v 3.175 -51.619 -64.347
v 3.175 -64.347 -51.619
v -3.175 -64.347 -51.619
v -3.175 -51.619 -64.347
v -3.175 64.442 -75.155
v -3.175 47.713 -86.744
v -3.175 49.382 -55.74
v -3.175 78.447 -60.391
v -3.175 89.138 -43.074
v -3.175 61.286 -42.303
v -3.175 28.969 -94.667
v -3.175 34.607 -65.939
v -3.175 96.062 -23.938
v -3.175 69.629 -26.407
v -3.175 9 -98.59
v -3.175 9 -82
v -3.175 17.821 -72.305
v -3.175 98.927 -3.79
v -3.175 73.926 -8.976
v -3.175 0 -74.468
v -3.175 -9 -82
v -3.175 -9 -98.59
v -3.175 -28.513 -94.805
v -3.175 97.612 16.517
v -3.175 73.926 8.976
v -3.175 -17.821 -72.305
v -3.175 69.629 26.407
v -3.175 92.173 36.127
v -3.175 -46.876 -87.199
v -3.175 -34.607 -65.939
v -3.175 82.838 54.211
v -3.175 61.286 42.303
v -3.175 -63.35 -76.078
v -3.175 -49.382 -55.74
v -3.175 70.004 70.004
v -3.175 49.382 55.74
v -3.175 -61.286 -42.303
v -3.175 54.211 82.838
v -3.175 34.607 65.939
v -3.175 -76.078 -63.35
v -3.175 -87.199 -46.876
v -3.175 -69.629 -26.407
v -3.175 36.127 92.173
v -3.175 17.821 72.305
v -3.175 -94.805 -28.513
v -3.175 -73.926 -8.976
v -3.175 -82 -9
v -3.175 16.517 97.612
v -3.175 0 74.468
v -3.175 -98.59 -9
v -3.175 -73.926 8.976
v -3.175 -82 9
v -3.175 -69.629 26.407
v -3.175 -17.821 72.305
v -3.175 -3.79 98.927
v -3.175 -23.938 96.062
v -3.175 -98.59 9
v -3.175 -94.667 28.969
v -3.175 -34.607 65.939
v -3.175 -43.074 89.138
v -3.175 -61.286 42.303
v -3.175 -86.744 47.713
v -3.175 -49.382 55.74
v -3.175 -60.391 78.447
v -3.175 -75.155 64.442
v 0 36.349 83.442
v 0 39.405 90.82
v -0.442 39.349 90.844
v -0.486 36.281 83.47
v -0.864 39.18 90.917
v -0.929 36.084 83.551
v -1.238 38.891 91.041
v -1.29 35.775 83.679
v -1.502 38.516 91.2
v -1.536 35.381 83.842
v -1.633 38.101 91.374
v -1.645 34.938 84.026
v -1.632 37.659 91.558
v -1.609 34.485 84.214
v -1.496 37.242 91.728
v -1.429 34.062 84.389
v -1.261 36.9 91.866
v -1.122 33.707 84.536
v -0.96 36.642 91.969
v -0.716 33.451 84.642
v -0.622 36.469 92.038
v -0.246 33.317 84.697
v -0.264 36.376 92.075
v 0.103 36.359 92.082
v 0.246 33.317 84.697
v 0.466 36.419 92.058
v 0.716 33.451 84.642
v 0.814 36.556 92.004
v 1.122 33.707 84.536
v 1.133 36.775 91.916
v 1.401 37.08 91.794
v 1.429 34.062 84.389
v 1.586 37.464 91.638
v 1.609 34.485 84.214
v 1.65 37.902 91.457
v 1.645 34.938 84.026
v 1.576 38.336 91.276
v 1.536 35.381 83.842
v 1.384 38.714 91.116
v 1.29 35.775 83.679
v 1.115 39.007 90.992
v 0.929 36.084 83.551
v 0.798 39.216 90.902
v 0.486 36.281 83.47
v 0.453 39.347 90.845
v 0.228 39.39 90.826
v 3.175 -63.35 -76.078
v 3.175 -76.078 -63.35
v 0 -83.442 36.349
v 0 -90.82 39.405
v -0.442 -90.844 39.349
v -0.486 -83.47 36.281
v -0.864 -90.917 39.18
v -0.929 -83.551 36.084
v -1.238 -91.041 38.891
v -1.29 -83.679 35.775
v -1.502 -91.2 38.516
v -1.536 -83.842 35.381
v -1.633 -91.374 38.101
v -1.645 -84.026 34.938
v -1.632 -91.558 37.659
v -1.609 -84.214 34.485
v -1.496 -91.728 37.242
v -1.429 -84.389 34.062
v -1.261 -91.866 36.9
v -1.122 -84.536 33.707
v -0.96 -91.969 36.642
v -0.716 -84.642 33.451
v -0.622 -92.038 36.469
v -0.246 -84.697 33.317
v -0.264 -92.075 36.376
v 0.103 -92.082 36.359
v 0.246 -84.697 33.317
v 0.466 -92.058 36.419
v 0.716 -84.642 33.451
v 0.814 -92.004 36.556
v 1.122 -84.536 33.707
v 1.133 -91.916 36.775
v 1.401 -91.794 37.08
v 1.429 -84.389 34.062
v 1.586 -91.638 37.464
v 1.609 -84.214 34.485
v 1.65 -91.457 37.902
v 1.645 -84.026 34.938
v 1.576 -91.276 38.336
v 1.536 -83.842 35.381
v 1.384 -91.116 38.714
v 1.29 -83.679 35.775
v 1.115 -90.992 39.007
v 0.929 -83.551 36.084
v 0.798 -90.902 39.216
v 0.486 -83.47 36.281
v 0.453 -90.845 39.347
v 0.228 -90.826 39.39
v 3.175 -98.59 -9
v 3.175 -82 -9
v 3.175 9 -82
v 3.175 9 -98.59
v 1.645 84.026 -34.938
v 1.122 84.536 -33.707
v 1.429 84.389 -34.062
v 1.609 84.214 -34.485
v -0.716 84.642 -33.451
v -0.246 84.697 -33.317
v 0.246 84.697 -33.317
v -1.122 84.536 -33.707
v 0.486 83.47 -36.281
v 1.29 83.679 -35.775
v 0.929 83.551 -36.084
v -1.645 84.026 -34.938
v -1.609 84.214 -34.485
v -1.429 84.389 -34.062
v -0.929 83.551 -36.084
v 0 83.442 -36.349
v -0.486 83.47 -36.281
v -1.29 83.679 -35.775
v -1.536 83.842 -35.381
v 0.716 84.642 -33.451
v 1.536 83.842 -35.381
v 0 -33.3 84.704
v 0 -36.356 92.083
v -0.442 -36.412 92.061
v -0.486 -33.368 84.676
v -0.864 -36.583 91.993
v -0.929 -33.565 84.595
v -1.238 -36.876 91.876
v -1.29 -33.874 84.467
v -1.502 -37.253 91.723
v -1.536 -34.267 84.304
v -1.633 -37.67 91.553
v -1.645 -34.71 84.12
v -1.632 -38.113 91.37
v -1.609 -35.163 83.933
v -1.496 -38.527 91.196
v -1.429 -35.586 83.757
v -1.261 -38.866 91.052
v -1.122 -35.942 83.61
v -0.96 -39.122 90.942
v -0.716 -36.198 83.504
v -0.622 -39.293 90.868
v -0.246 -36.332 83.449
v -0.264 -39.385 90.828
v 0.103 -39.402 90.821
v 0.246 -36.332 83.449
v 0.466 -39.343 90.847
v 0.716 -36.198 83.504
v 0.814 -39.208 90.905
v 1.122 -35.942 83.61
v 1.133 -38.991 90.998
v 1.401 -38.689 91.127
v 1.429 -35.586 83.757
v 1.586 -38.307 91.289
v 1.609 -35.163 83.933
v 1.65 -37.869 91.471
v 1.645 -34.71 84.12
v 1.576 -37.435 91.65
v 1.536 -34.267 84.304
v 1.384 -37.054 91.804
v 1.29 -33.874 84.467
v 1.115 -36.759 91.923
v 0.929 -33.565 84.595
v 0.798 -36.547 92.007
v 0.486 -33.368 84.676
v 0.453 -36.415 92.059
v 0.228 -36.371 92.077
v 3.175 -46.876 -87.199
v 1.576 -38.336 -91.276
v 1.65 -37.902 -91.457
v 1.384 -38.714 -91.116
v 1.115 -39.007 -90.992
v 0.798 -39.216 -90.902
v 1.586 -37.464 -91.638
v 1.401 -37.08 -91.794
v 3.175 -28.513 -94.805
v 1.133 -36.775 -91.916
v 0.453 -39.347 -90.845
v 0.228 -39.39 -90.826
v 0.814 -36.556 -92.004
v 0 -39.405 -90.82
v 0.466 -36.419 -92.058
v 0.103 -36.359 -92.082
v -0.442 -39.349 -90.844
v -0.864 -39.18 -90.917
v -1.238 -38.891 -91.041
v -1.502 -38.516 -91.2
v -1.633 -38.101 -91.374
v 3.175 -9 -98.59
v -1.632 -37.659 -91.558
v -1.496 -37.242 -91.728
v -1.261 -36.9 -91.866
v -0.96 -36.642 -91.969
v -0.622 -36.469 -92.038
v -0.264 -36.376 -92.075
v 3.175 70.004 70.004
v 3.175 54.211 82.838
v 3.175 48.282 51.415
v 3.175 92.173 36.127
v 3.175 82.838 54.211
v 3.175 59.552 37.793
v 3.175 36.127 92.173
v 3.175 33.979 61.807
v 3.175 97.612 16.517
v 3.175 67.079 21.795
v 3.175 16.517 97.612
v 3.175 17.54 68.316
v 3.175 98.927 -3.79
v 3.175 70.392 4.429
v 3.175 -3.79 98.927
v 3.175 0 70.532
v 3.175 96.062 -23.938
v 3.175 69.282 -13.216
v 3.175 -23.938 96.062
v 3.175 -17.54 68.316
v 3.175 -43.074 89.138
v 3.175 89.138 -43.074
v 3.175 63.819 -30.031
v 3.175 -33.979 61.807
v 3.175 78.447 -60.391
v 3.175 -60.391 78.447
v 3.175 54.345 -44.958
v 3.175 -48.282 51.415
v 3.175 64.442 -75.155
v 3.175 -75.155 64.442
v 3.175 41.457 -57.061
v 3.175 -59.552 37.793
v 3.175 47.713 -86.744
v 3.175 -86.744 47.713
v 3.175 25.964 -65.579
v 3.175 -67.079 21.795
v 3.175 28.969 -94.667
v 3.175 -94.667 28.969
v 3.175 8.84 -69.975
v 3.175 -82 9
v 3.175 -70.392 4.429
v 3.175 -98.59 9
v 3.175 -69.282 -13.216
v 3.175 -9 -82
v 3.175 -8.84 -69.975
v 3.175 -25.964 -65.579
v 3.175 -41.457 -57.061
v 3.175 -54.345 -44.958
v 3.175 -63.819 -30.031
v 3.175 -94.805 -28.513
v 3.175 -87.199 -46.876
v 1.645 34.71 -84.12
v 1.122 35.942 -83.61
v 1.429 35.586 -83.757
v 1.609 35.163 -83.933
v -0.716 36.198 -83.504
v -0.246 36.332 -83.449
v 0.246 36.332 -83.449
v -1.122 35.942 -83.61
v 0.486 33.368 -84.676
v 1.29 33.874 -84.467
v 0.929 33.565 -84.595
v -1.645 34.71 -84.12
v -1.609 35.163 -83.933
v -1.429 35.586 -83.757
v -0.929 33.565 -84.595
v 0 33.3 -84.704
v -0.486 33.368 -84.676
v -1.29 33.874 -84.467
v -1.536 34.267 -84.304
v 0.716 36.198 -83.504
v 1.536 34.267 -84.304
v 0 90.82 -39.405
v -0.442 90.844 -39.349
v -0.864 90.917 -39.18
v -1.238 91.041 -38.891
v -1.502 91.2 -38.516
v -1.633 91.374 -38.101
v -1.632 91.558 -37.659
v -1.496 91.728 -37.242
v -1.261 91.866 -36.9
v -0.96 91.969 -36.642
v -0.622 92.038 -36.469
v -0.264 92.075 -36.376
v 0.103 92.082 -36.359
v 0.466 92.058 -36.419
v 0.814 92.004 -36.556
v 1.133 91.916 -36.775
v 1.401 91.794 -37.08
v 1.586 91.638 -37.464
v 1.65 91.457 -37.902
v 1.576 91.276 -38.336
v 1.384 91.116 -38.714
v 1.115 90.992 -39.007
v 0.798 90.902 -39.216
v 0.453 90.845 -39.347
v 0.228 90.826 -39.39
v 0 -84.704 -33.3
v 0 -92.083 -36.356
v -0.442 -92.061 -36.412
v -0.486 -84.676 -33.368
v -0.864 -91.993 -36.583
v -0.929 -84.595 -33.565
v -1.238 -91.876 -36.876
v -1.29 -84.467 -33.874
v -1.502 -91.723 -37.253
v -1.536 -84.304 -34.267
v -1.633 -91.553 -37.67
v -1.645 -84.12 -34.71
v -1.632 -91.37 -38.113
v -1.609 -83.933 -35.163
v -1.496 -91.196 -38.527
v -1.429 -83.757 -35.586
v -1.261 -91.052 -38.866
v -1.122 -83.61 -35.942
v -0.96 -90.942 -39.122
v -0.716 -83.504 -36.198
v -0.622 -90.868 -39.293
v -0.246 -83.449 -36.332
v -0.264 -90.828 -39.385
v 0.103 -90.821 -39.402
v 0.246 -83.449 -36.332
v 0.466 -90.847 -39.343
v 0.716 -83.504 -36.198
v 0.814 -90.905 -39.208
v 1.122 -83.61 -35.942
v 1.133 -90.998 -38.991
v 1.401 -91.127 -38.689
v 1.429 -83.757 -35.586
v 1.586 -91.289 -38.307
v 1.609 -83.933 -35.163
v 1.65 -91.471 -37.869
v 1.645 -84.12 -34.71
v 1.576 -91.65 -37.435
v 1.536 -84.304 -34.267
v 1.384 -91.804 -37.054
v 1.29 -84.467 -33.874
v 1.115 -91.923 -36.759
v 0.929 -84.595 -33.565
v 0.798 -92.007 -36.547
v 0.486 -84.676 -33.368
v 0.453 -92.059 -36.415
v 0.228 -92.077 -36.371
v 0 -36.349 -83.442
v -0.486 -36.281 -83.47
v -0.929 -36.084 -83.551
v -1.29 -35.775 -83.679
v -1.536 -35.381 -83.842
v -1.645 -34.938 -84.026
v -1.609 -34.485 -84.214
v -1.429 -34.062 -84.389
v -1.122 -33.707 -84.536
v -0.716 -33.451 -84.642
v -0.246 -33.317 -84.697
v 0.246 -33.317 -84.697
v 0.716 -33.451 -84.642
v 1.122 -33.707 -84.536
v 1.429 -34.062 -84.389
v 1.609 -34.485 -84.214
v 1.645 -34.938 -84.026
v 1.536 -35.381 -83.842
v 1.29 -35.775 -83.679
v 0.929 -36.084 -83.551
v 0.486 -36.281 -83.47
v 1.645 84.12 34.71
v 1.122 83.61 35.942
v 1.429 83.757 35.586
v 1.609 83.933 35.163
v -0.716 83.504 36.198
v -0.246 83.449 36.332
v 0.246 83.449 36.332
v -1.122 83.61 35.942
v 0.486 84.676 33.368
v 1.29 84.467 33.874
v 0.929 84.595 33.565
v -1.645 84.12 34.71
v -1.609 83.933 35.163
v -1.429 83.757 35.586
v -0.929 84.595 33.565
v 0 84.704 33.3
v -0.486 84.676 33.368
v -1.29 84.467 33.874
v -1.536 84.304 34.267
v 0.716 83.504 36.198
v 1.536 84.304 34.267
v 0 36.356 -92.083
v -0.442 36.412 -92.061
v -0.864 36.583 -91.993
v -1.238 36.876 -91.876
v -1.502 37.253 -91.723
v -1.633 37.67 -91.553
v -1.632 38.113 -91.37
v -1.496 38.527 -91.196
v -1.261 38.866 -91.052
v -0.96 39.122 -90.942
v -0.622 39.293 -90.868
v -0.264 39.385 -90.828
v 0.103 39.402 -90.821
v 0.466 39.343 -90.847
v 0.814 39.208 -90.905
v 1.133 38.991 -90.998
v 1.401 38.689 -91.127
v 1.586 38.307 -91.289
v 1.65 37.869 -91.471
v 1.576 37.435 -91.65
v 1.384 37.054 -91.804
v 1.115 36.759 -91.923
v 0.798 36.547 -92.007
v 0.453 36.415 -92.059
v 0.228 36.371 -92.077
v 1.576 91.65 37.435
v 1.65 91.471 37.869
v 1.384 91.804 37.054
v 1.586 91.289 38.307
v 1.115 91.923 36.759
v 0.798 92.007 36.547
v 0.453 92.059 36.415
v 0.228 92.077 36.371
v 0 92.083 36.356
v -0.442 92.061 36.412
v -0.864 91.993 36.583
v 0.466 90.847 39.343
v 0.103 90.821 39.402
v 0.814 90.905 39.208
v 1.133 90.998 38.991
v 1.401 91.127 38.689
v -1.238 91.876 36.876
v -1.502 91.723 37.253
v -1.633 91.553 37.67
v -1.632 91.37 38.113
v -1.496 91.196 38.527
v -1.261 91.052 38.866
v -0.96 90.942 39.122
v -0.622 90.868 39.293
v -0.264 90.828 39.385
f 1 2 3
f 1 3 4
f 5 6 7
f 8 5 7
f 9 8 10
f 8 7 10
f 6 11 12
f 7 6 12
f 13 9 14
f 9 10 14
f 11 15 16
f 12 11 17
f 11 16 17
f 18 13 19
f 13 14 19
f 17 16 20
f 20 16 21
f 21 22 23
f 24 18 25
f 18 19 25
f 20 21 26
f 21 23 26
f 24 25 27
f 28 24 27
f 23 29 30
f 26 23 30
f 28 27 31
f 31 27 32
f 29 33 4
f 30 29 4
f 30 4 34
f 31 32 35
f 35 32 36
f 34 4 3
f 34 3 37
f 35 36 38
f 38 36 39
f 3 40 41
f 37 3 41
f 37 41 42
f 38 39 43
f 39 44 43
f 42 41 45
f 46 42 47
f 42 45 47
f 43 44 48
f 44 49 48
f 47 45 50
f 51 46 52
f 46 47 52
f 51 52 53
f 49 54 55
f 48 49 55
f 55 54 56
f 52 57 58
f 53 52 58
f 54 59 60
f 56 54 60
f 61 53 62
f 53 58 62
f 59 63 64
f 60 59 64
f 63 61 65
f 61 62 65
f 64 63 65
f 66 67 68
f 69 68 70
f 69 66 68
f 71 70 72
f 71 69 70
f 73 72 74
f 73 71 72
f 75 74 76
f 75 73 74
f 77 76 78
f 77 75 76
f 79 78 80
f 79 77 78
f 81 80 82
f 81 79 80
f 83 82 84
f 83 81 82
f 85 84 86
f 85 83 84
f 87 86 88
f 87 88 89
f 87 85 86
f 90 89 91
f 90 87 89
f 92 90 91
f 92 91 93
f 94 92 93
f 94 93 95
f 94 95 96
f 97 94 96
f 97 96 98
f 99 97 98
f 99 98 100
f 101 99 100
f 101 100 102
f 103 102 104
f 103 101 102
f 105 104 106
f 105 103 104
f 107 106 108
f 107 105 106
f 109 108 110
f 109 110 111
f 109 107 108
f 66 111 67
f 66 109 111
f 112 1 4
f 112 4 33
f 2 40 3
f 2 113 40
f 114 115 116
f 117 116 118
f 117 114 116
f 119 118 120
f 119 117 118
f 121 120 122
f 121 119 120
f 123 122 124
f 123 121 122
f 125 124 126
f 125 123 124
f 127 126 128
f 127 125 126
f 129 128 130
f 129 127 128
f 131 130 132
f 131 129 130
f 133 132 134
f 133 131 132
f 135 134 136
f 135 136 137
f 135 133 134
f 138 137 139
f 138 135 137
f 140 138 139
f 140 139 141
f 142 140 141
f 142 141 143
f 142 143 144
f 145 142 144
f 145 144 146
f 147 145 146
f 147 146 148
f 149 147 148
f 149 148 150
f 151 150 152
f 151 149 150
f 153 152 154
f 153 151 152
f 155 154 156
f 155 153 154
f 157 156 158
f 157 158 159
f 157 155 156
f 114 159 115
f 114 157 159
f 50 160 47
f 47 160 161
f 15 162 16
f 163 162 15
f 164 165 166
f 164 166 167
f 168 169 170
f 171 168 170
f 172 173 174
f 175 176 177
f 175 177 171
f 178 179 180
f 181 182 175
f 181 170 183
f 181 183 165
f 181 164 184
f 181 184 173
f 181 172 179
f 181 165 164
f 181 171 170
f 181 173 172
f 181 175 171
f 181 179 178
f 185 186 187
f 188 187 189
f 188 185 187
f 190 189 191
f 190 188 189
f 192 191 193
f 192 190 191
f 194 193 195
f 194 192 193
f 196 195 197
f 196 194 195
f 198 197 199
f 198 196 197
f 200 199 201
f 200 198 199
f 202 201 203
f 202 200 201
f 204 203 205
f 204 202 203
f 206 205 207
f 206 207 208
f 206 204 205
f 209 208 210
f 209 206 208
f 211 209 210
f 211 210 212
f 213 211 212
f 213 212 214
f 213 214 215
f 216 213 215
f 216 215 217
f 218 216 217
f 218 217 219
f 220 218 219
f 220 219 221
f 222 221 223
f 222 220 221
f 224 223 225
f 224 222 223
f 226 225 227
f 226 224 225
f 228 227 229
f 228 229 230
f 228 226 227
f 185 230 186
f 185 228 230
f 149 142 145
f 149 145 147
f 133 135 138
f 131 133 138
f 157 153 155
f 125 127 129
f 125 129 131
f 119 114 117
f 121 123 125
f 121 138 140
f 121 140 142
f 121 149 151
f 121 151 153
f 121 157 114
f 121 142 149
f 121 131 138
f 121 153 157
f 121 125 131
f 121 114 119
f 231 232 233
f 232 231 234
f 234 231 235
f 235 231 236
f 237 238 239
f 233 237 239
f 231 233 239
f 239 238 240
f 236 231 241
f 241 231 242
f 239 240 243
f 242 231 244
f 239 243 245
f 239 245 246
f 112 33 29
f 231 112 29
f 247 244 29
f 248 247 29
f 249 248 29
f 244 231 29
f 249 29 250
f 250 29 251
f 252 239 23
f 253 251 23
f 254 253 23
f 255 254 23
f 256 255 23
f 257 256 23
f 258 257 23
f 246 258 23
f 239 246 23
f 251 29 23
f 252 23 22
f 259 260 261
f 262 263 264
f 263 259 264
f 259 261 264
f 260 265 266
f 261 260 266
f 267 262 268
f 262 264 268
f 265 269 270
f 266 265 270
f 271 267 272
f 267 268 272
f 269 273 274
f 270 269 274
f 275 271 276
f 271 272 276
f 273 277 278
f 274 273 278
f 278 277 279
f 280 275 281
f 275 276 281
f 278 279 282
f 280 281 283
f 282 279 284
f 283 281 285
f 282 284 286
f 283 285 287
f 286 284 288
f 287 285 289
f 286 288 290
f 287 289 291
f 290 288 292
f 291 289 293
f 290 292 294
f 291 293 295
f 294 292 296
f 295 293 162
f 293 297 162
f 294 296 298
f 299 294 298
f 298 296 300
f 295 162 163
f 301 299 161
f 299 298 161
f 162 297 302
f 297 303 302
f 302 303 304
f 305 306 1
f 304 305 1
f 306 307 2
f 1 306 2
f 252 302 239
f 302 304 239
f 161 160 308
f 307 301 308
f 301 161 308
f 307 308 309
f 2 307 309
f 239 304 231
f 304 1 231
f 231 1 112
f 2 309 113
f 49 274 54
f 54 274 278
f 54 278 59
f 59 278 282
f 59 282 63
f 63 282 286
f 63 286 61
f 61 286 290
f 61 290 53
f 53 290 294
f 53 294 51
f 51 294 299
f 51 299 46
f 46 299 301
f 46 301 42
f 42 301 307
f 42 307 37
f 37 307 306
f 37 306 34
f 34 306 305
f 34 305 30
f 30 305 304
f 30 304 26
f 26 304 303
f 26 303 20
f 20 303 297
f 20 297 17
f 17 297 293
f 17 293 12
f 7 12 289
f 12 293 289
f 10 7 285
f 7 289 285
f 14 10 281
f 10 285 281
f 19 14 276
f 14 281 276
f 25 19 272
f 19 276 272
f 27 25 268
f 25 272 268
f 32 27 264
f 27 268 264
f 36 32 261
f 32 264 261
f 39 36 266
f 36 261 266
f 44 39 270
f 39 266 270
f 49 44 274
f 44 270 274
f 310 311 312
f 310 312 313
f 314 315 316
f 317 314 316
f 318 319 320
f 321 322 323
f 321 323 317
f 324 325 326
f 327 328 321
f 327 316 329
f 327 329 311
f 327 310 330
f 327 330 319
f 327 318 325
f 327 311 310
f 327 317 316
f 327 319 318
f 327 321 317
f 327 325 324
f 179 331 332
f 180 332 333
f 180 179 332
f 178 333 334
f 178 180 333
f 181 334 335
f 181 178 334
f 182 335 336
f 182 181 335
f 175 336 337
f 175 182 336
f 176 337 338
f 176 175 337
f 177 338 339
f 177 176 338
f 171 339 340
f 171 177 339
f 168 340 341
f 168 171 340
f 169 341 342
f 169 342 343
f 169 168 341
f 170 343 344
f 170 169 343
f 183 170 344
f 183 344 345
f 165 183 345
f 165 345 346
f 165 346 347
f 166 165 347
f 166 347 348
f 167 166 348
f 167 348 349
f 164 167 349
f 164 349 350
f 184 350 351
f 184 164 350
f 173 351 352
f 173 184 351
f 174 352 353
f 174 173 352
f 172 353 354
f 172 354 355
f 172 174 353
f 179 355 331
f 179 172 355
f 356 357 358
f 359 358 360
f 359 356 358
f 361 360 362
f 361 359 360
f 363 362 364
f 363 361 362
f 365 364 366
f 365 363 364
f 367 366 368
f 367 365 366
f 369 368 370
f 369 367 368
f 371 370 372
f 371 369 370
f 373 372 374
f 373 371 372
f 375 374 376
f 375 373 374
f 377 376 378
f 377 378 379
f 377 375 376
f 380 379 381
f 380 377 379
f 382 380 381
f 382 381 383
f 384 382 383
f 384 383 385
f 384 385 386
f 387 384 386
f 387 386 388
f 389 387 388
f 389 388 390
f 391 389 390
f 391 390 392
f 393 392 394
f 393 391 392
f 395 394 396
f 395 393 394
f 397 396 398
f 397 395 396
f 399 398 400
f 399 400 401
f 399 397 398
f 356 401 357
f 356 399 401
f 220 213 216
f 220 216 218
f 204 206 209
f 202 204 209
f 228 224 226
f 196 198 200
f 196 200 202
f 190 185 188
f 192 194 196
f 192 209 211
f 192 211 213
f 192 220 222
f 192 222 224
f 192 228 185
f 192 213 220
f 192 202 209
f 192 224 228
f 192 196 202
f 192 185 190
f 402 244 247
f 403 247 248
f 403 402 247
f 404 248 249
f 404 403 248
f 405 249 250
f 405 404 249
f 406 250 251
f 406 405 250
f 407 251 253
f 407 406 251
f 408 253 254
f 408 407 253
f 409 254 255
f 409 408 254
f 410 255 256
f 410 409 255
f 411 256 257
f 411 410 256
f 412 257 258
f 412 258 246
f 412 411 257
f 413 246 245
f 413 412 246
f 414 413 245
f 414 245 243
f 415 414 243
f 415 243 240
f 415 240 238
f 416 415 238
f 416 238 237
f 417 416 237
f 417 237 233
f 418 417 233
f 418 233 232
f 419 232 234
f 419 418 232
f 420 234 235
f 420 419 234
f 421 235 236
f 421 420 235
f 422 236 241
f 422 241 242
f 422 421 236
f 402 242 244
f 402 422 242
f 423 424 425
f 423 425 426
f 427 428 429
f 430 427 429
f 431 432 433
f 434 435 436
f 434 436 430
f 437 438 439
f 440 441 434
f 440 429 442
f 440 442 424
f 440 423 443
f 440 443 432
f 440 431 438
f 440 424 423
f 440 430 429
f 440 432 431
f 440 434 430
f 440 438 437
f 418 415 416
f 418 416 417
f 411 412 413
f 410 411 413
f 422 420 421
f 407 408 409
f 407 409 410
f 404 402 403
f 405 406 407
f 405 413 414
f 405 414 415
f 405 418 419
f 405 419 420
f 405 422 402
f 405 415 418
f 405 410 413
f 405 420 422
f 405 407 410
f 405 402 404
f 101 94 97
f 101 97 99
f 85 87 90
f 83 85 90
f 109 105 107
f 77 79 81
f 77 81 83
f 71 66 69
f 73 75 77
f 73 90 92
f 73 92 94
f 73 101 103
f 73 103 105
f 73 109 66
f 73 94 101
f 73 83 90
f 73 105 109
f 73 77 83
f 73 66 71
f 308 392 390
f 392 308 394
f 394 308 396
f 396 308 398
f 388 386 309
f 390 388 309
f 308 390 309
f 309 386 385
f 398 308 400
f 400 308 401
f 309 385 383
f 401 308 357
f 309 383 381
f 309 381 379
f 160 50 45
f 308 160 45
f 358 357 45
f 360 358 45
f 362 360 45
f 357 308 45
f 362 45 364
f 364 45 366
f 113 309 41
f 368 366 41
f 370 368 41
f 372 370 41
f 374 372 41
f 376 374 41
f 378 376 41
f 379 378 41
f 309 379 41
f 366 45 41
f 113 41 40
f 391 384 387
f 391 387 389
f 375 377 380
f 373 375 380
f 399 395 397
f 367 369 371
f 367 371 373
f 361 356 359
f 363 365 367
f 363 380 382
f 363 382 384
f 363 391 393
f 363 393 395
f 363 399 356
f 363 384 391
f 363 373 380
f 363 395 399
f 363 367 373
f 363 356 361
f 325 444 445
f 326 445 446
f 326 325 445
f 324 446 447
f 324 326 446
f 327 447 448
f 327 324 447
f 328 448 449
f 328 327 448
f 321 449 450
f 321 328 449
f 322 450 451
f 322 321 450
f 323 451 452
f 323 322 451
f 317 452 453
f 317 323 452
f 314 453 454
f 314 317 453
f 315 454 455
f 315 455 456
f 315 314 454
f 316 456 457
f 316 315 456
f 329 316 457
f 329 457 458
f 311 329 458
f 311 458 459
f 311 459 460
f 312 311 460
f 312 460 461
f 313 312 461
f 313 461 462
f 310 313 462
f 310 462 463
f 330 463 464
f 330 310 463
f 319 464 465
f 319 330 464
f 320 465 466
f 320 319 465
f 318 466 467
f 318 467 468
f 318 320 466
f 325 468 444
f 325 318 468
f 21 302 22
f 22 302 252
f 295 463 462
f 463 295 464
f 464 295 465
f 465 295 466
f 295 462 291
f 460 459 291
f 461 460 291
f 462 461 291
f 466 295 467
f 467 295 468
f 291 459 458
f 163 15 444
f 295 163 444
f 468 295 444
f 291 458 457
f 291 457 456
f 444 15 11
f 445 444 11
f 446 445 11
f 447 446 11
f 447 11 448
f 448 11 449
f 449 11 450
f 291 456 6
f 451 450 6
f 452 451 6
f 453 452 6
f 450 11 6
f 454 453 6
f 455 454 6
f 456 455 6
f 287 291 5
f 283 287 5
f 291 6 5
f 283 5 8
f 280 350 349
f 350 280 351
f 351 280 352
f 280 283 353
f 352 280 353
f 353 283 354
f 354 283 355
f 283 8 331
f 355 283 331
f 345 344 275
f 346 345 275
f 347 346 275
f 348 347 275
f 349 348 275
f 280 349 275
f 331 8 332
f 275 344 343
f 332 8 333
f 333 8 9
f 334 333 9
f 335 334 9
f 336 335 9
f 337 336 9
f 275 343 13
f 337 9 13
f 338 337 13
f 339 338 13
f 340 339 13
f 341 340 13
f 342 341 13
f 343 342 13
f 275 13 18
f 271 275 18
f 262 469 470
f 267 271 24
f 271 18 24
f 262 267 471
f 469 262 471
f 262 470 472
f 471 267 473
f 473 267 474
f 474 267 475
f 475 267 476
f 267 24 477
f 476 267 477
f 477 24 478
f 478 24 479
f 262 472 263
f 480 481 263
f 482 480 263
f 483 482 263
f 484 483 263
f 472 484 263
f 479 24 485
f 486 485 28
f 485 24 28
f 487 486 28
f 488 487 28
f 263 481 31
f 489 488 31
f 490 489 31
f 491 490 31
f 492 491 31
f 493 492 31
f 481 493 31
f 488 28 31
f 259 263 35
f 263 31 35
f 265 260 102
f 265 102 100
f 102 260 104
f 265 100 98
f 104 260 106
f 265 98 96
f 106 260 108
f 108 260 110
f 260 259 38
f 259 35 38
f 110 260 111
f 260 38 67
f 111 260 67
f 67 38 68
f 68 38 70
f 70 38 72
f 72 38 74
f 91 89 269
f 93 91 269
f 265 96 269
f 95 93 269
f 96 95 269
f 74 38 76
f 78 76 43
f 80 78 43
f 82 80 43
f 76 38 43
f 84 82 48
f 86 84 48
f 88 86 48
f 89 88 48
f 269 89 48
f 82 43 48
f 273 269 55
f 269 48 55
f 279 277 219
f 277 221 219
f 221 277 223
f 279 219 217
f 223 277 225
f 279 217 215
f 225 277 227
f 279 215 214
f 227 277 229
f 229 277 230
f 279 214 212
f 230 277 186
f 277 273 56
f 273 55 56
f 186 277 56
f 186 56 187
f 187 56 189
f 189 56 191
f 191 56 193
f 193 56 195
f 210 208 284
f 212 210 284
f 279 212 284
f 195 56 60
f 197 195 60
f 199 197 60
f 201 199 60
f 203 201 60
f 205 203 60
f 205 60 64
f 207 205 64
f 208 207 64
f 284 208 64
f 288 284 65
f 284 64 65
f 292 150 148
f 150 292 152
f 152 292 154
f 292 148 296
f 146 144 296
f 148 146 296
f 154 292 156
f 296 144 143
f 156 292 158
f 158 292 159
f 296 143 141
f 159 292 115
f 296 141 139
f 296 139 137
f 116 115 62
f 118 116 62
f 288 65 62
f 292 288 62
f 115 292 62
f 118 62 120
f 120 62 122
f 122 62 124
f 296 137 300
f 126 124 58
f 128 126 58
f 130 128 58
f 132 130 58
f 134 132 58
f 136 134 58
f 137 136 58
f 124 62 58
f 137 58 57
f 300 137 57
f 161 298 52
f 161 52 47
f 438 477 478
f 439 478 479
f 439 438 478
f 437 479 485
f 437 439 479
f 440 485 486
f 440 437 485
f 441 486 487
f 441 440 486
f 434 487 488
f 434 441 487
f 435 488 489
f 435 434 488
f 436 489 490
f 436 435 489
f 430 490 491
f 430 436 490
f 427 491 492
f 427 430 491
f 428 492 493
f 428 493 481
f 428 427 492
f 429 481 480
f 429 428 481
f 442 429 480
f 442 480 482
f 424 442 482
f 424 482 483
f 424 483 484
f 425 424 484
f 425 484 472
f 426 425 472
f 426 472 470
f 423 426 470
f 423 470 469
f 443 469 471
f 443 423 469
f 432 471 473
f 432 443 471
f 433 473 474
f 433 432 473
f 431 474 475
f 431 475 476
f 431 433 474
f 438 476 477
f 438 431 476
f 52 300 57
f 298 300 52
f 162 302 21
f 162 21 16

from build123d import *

# Parameters (mm, degrees)
NOTCH_180_SKETCH_W   = 18
NOTCH_180_SKETCH_H   = 19
NOTCH_180_DEPTH      = 4.175
NOTCH_225_DEPTH      = 4.175
NOTCH_270_SKETCH_W   = 19
NOTCH_270_SKETCH_H   = 18
NOTCH_270_DEPTH      = 4.175
SCREW_HOLE_SKETCH_W  = 1.65
SCREW_HOLE_SKETCH_H  = 9
SCREW_HOLES_X8_COUNT = 8


with BuildPart() as part:
    # Ring Sketch → Ring (revolve)
    with BuildSketch(Plane.XY):
        Polygon((3.175, 70.5315), (3.175, 99), (-3.175, 99), (-3.175, 74.4685), align=None)
    revolve(axis=Axis((-300, 0, 0), (1, 0, 0)))

    # Notch 180 Sketch → Notch 180 (cut, symmetric)
    with BuildSketch(Plane(origin=(0, 0, 0), x_dir=(0, 0, -1), z_dir=(1, 0, 0))):
        with Locations((0, -91.5)):
            Rectangle(NOTCH_180_SKETCH_W, NOTCH_180_SKETCH_H)
    extrude(amount=NOTCH_180_DEPTH, both=True, mode=Mode.SUBTRACT)

    # Notch 225 Sketch → Notch 225 (cut, symmetric)
    with BuildSketch(Plane(origin=(0, 0, 0), x_dir=(0, 0, -1), z_dir=(1, 0, 0))):
        Polygon((51.618795027, -64.346717088), (64.346717088, -51.618795027), (77.781745931, -65.053823869), (65.053823869, -77.781745931), align=None)
    extrude(amount=NOTCH_225_DEPTH, both=True, mode=Mode.SUBTRACT)

    # Notch 270 Sketch → Notch 270 (cut, symmetric)
    with BuildSketch(Plane(origin=(0, 0, 0), x_dir=(0, 0, -1), z_dir=(1, 0, 0))):
        with Locations((91.5, 0)):
            Rectangle(NOTCH_270_SKETCH_W, NOTCH_270_SKETCH_H)
    extrude(amount=NOTCH_270_DEPTH, both=True, mode=Mode.SUBTRACT)

    # Screw Hole Sketch → Screw Hole (revolve, cut)
    with BuildSketch(Plane(origin=(0, 0, 0), x_dir=(-1, 0, 0), z_dir=(0, -0.3826834323650898, 0.9238795325112867))):
        with Locations((-0.825, -95.5)):
            Rectangle(SCREW_HOLE_SKETCH_W, SCREW_HOLE_SKETCH_H)
    screw_hole = revolve(axis=Axis((0, 81.301398861, 33.676142048), (0, 0.9238795325112867, 0.38268343236509)), mode=Mode.SUBTRACT)

    # Screw Holes x8: Screw Hole ×8 about axis
    screw_holes_x8_axis = Axis((3.4925, 0, 0), (-1, 0, 0))
    for i in range(1, SCREW_HOLES_X8_COUNT):
        add(screw_hole.rotate(screw_holes_x8_axis, i * 360 / SCREW_HOLES_X8_COUNT), mode=Mode.SUBTRACT)


solid = part.part
